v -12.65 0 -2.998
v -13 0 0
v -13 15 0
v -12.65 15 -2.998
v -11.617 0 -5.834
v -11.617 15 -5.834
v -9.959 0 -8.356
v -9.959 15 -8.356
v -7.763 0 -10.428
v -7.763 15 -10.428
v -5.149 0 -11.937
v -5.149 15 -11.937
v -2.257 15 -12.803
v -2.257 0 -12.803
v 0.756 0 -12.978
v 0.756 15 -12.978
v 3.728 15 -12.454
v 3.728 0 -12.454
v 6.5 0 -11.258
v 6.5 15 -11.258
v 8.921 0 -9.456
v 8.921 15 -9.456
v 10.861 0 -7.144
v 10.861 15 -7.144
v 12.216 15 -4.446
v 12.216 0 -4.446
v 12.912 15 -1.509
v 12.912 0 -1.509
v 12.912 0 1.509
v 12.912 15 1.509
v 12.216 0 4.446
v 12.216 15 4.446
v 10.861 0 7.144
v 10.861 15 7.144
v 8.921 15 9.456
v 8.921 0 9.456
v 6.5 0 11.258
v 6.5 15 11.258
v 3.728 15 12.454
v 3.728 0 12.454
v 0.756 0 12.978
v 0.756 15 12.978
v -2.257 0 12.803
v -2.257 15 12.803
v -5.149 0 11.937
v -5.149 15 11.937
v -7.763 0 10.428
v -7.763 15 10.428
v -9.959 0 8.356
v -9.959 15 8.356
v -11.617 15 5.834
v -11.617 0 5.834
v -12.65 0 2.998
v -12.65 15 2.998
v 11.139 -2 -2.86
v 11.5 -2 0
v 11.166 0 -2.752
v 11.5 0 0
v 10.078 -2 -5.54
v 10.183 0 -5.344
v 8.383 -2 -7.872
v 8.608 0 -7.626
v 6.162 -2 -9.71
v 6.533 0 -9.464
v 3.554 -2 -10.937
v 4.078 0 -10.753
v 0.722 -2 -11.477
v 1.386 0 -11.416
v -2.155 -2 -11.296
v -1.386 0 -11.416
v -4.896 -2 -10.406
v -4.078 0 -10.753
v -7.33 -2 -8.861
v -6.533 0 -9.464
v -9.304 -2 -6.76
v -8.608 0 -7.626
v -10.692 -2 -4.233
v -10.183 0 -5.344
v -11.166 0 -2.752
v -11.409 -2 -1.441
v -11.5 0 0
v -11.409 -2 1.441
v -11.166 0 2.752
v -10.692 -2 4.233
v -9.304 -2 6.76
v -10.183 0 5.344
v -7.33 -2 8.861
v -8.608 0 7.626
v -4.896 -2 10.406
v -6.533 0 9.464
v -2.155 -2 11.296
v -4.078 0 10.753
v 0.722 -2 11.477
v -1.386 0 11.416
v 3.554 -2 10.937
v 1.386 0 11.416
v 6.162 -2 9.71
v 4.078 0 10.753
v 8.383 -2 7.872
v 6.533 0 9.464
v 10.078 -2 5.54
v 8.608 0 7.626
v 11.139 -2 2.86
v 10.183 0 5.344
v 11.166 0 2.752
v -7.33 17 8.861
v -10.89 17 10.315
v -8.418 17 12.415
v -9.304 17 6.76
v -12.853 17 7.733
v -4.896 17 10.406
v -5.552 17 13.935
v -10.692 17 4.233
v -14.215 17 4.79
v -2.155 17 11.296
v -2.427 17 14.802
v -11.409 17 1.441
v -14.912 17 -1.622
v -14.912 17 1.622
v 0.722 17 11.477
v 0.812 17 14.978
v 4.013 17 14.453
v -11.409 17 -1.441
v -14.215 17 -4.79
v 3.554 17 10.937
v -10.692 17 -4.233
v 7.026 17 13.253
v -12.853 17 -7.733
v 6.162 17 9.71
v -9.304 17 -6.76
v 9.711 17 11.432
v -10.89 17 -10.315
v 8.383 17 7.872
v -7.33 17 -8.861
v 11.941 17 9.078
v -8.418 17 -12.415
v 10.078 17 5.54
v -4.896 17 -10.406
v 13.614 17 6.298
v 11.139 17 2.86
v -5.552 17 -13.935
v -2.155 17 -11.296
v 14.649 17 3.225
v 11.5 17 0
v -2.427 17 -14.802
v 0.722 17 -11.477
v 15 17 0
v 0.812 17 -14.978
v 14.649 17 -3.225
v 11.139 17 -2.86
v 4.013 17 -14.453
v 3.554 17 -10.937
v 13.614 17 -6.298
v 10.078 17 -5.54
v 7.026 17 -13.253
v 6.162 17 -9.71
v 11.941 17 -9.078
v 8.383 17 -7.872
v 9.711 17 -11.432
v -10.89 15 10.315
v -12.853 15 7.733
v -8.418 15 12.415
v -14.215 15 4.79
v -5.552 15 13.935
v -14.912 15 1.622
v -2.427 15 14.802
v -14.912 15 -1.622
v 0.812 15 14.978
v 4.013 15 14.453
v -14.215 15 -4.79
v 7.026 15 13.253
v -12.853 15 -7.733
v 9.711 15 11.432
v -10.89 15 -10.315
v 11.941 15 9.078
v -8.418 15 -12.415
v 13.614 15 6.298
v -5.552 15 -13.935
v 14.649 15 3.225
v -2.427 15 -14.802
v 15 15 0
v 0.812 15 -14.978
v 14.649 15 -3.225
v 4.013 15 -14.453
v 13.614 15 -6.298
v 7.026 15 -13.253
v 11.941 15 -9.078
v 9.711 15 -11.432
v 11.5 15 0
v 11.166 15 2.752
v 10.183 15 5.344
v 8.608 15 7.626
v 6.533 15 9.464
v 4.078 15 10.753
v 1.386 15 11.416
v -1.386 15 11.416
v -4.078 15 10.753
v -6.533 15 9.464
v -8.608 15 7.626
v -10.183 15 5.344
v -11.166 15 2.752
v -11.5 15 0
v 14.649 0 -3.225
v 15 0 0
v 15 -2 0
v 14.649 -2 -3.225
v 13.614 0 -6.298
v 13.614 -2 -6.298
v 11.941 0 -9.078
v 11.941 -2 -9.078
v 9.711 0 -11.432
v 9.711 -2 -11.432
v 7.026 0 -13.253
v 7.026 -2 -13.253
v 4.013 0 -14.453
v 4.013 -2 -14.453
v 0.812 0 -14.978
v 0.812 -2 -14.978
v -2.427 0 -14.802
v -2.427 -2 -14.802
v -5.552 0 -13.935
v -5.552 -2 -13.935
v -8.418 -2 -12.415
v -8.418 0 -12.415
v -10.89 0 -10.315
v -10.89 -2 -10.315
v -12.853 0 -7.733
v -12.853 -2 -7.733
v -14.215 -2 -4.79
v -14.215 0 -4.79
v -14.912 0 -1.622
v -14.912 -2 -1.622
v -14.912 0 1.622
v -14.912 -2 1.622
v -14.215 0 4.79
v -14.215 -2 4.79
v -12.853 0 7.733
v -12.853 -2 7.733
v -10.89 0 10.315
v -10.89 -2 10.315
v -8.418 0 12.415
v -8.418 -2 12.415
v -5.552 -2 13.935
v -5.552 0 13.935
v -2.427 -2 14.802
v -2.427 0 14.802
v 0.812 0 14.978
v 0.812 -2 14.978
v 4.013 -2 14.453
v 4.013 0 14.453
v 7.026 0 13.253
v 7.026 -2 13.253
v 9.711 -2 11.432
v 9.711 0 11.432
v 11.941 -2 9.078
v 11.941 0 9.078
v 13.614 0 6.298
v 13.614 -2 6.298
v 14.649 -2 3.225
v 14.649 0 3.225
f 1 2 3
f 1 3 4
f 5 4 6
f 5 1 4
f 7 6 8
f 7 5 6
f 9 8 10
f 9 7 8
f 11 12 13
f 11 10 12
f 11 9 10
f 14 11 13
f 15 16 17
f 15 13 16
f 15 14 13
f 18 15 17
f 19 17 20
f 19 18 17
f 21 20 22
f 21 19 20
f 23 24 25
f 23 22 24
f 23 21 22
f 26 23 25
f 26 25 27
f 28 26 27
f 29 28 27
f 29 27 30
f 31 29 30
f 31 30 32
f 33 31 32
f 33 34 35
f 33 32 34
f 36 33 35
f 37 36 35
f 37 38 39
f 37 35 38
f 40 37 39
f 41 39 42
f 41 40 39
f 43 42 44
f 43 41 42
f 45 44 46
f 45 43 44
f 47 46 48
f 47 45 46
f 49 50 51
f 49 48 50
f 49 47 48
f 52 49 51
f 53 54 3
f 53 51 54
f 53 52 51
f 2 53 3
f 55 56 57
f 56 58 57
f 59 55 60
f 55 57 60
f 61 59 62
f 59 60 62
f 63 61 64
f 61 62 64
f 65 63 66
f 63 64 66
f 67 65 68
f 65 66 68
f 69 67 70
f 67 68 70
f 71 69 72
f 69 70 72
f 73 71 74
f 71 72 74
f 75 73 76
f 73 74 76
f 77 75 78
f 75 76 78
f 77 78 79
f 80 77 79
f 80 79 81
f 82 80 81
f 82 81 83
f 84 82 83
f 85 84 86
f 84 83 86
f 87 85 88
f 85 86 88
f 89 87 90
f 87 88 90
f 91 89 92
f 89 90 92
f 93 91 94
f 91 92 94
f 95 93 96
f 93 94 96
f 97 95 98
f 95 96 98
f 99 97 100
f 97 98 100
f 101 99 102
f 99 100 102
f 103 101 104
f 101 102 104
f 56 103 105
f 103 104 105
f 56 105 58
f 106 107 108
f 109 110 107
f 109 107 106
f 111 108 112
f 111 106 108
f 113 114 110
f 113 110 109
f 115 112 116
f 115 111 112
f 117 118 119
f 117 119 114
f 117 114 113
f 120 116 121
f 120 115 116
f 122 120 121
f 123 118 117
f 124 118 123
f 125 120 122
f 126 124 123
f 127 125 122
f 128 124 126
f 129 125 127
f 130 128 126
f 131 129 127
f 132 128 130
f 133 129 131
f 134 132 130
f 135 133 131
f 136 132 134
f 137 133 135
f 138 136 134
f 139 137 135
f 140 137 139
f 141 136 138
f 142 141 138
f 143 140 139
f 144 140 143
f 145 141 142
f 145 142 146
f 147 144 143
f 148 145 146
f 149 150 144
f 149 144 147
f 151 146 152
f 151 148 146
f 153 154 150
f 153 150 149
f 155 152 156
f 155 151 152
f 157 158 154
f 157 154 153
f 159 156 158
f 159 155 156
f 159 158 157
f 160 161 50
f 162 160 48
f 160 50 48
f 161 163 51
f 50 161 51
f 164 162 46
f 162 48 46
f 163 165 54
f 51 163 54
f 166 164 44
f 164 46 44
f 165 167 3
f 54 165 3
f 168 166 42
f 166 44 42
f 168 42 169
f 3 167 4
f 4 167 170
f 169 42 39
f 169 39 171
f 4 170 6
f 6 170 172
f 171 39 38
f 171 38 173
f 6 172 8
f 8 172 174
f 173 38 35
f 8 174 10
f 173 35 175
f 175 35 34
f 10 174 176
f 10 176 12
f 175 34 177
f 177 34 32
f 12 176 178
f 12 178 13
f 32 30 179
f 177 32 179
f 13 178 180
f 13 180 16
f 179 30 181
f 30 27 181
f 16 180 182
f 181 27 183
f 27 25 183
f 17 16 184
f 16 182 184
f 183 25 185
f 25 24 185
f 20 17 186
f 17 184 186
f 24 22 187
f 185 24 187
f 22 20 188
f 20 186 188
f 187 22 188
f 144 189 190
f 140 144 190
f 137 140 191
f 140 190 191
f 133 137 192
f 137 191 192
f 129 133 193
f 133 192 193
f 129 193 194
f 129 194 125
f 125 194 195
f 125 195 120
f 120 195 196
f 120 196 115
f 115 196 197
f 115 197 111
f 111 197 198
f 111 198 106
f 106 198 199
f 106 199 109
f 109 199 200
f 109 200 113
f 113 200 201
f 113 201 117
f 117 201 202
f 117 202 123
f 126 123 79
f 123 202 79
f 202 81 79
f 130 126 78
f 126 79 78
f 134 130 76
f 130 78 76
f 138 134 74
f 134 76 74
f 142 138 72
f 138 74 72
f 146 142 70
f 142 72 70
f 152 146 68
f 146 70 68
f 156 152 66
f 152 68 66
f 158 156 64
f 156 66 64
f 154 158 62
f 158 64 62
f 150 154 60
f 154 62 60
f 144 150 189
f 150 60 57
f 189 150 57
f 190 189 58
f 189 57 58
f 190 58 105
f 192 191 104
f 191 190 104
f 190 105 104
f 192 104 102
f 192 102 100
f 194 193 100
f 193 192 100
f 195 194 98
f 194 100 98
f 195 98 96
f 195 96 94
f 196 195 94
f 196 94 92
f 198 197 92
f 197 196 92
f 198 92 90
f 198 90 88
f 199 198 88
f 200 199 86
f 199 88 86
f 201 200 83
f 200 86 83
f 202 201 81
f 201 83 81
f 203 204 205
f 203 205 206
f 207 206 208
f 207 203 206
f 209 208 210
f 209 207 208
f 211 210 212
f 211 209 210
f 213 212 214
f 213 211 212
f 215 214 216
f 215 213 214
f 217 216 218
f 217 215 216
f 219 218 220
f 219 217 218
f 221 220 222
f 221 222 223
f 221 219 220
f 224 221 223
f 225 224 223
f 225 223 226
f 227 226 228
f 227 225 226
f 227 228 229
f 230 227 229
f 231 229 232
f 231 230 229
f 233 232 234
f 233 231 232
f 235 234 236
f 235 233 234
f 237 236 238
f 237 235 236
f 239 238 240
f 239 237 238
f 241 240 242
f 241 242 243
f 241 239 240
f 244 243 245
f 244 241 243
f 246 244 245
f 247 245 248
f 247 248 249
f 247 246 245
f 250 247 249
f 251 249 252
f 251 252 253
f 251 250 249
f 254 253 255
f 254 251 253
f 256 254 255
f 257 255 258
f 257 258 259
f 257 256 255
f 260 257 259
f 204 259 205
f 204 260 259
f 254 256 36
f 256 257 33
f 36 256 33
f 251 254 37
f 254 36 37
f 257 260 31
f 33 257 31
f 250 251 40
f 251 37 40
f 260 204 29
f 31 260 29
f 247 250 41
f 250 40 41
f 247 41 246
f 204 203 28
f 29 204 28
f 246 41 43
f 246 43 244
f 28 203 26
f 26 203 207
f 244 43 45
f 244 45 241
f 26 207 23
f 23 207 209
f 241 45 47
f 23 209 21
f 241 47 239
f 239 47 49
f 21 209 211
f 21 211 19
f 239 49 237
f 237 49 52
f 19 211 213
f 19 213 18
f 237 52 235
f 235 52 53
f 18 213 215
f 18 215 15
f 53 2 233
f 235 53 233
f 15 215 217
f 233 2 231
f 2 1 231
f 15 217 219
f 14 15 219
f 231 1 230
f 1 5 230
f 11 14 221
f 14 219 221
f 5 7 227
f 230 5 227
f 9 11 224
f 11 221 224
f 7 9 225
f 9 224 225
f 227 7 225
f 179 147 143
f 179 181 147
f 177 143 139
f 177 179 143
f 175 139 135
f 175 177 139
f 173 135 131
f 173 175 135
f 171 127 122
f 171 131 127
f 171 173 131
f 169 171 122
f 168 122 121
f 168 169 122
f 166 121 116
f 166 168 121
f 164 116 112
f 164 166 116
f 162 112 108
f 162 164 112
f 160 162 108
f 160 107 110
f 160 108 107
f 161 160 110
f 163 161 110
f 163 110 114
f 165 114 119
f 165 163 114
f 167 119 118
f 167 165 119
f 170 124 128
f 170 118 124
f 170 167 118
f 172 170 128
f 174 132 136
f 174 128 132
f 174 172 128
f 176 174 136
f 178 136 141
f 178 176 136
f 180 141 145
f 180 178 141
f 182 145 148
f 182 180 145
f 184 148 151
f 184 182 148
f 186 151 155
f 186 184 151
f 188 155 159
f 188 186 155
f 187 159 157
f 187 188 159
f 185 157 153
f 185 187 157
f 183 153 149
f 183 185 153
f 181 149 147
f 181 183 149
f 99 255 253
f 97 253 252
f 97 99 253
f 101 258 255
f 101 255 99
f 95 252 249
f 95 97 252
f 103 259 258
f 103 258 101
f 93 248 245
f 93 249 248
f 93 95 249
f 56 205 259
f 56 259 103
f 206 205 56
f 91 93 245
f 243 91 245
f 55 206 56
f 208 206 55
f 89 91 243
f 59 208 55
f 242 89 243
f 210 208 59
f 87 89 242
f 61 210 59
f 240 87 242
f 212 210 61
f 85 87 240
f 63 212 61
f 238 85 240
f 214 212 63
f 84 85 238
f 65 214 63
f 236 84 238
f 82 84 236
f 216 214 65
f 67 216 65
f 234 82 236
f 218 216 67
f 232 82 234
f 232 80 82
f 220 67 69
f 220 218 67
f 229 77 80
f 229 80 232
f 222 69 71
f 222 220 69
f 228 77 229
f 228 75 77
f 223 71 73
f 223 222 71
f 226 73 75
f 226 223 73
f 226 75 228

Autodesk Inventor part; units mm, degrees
ref_plane "YZ Plane" through (0, 0, 0) normal (1, 0, 0) x (0, 1, 0)
ref_plane "XZ Plane" through (0, 0, 0) normal (0, 1, 0) x (-1, 0, 0)
sketch "Sketch1" plane through (0, 0, 0) normal (0, 1, 0) x (-1, 0, 0)
  circle A0 centre (0, 0) radius 13
  circle A1 centre (0, 0) radius 11.5
  dimension "d0" = 26
  dimension "d1" = 23
extrude "Extrusion1" add sketch "Sketch1" along normal blind 15
sketch "Sketch2" plane through (0, 15, 0) normal (0, 1, 0) x (1, 0, 0)
  circle A0 centre (0, 0) radius 15
  circle A1 centre (0, 0) radius 11.5 projected
  dimension "d4" = 30
extrude "Extrusion2" add sketch "Sketch2" along normal blind 2
ref_plane "Work Plane1" through (0, 7.5, 0) normal (0, -1, 0) x (1, 0, 0)
mirror "Mirror1" about plane through (0, 7.5, 0) normal (0, -1, 0) of "Extrusion2"
properties part number "inner tube"
